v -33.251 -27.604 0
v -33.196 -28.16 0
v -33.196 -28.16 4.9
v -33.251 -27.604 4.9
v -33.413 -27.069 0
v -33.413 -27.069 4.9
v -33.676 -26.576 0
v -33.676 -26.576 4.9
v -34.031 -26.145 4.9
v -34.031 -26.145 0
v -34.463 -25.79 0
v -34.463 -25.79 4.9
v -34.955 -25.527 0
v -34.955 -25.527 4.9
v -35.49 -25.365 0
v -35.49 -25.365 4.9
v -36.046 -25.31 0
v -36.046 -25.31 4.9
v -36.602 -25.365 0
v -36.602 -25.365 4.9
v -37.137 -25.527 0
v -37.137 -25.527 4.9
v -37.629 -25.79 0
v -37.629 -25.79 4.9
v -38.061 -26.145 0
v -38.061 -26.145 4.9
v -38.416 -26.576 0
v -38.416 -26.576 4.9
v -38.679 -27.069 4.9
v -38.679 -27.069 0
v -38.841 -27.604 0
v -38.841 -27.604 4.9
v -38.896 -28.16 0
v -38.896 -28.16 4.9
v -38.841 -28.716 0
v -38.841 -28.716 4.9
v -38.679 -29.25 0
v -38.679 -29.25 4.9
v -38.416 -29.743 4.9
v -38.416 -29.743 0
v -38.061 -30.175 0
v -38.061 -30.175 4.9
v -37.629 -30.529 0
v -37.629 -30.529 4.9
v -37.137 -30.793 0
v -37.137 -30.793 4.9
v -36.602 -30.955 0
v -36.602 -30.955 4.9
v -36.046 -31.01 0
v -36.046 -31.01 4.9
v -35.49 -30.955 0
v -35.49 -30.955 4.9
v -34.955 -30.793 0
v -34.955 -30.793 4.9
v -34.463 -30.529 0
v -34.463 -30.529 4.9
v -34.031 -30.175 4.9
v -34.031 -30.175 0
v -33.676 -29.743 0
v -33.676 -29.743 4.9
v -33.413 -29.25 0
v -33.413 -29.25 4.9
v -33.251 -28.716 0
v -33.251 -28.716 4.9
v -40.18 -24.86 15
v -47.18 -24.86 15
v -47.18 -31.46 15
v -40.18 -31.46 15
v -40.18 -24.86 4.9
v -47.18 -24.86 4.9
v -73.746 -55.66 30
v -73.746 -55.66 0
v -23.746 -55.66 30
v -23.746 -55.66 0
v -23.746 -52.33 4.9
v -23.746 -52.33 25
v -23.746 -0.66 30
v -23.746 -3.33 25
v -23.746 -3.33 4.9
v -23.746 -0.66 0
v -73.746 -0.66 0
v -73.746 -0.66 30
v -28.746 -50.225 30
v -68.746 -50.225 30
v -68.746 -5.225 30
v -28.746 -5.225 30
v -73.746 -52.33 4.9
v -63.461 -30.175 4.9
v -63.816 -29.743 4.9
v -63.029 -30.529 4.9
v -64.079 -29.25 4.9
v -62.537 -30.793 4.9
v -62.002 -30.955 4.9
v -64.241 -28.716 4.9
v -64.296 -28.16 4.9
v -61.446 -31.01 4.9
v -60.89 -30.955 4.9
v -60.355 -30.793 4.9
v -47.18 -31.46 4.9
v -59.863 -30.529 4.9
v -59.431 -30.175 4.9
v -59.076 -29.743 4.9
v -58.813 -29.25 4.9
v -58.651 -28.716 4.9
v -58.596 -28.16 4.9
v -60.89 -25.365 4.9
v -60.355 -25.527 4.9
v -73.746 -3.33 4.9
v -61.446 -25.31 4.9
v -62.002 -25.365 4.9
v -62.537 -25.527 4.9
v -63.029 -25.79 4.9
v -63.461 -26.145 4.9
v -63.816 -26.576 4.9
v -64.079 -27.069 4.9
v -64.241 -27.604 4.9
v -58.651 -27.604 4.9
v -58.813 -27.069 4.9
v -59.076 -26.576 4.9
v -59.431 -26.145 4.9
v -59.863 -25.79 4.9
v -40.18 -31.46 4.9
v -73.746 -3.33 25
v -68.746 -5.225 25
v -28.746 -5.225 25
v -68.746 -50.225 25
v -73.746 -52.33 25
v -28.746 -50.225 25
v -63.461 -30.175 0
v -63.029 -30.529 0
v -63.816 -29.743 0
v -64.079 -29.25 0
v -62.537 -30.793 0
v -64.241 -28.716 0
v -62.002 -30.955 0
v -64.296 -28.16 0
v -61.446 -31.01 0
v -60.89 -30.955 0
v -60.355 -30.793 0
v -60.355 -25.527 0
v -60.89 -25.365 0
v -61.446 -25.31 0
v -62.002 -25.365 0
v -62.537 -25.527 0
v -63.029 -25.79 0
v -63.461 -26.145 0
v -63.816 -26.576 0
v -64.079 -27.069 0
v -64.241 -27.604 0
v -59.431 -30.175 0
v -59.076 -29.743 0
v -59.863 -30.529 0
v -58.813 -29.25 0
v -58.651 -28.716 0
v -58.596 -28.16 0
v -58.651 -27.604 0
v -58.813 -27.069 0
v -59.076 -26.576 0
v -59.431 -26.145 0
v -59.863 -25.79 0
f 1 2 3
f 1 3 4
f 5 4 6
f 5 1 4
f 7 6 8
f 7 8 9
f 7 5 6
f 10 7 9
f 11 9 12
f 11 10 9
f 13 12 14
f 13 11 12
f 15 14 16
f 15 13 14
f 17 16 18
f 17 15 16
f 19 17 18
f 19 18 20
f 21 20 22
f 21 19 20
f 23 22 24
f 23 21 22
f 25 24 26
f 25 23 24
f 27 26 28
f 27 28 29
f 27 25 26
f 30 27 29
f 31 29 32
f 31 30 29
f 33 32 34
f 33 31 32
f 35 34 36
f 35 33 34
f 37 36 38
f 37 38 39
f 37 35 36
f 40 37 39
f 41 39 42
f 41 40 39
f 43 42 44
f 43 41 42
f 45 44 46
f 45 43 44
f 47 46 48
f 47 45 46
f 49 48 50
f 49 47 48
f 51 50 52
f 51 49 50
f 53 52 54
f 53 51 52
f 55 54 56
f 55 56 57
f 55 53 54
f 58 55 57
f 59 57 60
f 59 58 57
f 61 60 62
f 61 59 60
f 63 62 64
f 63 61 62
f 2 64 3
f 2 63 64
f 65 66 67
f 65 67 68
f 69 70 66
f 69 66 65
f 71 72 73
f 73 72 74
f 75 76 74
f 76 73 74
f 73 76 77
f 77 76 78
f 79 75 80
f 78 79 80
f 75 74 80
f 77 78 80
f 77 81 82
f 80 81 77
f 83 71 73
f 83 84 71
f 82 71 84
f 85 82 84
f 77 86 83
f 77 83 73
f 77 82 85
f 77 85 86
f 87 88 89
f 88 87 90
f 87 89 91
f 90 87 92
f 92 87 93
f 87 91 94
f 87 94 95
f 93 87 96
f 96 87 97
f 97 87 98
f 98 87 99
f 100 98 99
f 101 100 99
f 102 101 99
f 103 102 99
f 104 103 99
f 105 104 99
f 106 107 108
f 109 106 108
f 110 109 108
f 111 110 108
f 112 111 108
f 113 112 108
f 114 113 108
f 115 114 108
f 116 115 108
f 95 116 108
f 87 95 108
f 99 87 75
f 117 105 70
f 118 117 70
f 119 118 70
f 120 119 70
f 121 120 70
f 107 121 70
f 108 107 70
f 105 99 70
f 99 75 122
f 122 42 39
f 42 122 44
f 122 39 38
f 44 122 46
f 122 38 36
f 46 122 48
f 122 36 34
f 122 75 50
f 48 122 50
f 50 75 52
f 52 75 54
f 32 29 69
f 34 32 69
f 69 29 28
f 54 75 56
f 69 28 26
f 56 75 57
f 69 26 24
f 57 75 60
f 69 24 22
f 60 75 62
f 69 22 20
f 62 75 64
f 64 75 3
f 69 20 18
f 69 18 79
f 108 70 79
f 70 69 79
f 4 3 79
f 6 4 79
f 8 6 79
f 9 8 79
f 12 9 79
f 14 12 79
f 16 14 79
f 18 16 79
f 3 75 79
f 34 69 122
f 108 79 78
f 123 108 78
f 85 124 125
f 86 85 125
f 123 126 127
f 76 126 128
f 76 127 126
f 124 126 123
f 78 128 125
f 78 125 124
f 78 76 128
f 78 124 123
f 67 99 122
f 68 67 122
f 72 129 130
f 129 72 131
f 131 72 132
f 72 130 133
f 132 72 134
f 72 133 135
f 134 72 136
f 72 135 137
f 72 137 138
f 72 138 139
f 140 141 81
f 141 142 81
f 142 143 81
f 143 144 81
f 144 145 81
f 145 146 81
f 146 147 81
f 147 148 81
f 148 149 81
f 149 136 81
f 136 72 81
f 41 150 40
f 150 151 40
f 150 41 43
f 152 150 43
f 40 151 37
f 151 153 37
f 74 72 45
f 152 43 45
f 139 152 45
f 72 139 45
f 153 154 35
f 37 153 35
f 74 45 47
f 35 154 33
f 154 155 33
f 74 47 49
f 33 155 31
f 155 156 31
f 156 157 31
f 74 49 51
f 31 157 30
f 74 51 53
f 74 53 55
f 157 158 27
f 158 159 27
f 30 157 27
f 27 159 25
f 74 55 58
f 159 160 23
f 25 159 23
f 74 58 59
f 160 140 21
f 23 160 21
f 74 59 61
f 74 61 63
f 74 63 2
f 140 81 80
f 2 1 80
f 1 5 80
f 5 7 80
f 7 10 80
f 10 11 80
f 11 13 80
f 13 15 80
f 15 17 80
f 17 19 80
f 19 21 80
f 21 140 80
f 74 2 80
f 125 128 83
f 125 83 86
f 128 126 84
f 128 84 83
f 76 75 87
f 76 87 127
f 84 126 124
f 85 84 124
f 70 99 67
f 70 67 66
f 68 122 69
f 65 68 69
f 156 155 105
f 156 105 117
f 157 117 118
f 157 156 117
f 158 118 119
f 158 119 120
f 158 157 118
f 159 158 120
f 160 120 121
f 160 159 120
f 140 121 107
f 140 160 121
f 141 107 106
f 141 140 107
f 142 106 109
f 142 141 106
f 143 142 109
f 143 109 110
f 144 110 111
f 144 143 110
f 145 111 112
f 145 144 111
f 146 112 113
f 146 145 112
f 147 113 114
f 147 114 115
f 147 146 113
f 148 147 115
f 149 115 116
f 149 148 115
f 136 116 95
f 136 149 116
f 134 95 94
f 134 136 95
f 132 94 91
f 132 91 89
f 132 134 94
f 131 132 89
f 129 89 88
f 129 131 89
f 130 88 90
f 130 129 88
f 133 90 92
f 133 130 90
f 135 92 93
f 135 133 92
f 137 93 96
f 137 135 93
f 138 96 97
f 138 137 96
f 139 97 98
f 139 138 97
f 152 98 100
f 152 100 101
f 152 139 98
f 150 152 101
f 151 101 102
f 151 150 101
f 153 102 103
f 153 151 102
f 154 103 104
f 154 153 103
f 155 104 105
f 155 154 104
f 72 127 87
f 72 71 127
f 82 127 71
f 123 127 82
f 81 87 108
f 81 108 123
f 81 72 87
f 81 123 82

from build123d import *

# Parameters (mm, degrees)
F2_W     = 50
F2_H     = 55
F3_DEPTH = 30
F4_W     = 49
F4_H     = 20.1
F5_DEPTH = 50.001
F0_R     = 2.85
F6_DEPTH = 4.9
F0_W     = 7
F0_H     = 6.6
F7_DEPTH = 15
F8_START = 25
F1_W     = 40
F1_H     = 45
F8_DEPTH = 25


# Not quite as in the source:
# - a feature names something its author has since deleted; it is built from what else it names


with BuildPart() as f3:
    # F2 (on Top) → F3 (new body)
    with BuildSketch(Plane.XY):
        with Locations((-48.7460665315, -28.1598071134)):
            Rectangle(F2_W, F2_H)
    extrude(amount=F3_DEPTH)

    # F4 (on face) → F5 (cut, through all)
    with BuildSketch(Plane.YZ.offset(-23.7460665315)):
        with Locations((-27.83, 14.95)):
            Rectangle(F4_W, F4_H)
    extrude(amount=-F5_DEPTH, mode=Mode.SUBTRACT)

    # F0 (on Top) → F6 (cut, through all)
    with BuildSketch(Plane.XY):
        with Locations((-36.0460665315, -28.1598071134)):
            Circle(F0_R)
        with Locations((-61.4460665315, -28.1598071134)):
            Circle(F0_R)
    extrude(amount=F6_DEPTH, mode=Mode.SUBTRACT)

    # F0 (on Top) → F7 (join)
    with BuildSketch(Plane.XY):
        with Locations((-43.6801504195, -28.1598071134)):
            Rectangle(F0_W, F0_H)
    extrude(amount=F7_DEPTH)

    # F1 (on Top) → F8 (cut)
    with BuildSketch(Plane.XY.offset(F8_START)):
        with Locations((-48.7460665315, -27.7248071134)):
            Rectangle(F1_W, F1_H)
    extrude(amount=F8_DEPTH, mode=Mode.SUBTRACT)


solid = f3.part
